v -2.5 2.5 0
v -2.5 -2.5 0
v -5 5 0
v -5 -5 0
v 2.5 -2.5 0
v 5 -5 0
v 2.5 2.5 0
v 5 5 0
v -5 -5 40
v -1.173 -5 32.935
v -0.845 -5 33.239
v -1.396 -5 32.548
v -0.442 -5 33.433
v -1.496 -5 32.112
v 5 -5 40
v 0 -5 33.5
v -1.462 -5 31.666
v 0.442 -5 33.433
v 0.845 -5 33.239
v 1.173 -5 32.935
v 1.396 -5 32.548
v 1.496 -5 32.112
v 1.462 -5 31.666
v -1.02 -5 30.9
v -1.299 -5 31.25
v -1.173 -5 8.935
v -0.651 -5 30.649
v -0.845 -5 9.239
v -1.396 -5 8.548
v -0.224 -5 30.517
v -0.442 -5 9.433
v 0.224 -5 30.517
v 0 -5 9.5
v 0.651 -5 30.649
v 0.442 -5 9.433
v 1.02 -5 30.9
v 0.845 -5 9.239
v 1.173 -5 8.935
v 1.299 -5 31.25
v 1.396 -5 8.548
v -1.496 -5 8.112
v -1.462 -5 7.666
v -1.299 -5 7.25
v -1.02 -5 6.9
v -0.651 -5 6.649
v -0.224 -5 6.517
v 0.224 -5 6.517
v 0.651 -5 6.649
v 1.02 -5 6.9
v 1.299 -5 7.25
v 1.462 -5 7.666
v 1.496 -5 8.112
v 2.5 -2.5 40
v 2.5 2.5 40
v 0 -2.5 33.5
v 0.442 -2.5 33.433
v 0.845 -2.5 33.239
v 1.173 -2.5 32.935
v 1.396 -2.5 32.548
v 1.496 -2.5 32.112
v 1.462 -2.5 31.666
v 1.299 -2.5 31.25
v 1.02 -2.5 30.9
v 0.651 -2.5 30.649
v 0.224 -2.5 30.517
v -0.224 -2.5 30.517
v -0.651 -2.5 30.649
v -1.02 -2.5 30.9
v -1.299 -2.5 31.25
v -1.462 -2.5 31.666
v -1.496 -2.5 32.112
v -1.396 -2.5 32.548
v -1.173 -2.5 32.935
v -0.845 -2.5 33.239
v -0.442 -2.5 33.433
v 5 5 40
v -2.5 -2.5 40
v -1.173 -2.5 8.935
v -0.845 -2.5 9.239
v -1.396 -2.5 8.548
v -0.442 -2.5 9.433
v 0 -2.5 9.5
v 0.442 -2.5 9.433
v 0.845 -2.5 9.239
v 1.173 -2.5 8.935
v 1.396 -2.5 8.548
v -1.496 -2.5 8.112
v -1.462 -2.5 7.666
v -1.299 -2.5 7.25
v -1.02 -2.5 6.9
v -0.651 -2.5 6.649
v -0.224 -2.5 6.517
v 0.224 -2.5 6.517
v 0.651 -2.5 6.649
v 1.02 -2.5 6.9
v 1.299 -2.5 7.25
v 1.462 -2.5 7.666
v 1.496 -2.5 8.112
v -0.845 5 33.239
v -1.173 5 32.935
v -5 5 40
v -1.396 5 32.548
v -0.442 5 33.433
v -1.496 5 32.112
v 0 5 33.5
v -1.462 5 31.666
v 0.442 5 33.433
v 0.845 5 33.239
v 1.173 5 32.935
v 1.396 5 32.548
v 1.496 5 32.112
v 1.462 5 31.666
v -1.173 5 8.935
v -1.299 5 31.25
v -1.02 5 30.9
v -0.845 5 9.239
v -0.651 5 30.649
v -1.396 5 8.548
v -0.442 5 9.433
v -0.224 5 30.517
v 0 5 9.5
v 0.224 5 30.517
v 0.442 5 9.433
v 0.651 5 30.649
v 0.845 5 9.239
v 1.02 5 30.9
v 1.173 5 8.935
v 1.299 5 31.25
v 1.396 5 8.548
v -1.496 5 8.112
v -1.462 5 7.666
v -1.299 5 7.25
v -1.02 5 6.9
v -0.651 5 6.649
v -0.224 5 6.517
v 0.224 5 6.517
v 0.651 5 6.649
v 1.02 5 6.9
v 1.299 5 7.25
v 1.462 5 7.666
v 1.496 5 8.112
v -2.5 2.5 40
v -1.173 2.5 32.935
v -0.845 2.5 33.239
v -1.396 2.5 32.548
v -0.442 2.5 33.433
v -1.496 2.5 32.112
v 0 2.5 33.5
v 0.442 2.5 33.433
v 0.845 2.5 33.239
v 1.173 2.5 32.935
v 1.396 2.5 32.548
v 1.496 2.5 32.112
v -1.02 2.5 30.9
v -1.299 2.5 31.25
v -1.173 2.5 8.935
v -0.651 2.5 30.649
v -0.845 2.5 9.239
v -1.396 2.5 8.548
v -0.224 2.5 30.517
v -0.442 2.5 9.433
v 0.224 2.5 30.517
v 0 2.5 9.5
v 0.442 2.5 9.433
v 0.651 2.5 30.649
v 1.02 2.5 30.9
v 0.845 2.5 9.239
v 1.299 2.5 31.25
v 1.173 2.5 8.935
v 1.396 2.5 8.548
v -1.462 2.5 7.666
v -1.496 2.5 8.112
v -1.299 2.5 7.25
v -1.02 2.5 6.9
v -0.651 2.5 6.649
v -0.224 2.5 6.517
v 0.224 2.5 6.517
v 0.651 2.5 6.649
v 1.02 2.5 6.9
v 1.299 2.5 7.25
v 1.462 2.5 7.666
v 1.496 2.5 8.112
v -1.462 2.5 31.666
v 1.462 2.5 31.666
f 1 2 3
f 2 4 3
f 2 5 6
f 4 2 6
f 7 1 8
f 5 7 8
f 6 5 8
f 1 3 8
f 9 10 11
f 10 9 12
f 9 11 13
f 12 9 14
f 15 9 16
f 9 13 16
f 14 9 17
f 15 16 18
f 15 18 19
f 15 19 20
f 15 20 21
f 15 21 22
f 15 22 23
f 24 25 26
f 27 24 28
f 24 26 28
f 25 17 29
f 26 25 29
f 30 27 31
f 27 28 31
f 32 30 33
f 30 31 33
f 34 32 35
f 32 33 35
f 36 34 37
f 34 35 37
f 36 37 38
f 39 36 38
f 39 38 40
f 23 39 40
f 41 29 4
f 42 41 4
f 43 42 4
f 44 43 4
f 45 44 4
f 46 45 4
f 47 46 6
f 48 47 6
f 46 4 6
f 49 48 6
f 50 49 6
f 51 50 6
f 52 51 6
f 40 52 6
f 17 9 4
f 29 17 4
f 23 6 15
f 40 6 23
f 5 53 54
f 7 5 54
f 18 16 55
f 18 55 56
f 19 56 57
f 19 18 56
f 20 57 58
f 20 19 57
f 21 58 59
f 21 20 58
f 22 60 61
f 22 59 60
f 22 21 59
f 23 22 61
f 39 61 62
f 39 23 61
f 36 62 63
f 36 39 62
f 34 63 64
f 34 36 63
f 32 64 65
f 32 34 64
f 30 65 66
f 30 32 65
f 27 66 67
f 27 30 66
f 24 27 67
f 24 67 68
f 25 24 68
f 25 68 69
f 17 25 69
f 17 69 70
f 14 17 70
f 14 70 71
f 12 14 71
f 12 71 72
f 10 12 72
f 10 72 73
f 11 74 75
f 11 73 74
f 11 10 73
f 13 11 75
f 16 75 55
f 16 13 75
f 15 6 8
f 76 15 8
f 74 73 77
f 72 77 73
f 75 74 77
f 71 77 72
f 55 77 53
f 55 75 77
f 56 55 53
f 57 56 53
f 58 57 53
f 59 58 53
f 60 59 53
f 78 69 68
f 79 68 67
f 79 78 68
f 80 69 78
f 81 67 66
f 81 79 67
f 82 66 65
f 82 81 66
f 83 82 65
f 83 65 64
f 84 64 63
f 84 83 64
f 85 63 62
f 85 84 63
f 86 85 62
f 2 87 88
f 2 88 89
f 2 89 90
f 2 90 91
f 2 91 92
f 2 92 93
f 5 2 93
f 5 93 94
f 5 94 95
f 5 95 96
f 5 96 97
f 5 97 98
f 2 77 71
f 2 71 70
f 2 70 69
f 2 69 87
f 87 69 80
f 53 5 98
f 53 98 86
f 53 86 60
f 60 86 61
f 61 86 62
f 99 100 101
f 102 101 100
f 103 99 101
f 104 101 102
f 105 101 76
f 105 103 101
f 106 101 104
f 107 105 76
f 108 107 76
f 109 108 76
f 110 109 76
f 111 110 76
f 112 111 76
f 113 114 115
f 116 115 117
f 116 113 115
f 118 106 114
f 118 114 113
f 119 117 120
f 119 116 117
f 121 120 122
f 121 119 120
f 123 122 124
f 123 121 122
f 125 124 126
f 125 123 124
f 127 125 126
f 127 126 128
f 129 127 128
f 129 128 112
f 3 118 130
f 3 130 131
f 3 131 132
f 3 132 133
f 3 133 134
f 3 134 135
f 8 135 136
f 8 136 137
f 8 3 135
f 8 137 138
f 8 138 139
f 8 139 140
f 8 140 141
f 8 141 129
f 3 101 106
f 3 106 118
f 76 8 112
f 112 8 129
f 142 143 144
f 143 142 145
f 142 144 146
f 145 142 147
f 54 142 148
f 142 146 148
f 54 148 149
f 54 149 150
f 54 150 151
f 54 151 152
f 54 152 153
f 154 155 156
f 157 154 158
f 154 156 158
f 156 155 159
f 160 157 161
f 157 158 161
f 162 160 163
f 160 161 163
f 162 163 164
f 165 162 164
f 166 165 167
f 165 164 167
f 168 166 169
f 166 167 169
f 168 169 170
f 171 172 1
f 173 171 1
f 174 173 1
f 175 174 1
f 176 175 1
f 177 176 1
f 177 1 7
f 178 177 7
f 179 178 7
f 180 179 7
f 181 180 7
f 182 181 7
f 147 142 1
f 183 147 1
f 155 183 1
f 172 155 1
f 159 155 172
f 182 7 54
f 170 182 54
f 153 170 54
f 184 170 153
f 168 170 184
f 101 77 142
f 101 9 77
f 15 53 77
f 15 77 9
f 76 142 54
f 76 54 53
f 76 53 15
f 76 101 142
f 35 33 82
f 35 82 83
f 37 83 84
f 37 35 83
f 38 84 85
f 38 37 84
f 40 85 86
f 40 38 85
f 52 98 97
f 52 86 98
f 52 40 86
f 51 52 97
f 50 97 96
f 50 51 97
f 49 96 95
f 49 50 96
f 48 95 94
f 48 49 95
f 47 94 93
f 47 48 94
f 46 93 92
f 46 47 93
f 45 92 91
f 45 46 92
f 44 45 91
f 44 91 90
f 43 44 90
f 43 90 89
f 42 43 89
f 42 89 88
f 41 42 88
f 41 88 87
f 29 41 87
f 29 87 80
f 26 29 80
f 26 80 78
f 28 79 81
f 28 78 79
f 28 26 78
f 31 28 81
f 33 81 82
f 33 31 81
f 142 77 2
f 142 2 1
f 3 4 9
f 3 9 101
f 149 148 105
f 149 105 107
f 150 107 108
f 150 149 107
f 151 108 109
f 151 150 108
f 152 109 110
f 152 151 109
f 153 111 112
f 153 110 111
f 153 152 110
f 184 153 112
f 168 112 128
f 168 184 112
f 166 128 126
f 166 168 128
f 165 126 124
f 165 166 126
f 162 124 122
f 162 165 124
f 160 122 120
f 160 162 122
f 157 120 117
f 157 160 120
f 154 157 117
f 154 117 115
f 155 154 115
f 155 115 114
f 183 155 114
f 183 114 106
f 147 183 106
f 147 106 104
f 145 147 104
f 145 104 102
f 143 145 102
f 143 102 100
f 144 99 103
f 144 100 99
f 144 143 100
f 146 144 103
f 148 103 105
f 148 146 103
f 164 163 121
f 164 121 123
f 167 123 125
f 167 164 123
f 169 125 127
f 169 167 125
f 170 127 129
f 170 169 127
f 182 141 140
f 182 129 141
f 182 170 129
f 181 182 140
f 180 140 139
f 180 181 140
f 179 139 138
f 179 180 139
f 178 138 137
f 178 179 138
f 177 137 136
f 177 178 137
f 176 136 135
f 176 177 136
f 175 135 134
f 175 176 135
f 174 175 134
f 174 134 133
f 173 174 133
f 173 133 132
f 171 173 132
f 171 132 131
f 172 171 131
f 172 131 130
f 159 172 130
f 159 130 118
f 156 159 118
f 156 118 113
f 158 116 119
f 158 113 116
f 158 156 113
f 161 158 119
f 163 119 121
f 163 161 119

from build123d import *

# Parameters (mm, degrees)
SKETCH_1_W               = 10
SKETCH_1_H               = 10
EXTRUDE_1_DEPTH          = 40
CUT_EXTRUDE_1_DEPTH      = 42.533119315
CUT_EXTRUDE_1_DEPTH_BACK = 42.533119315
SKETCH_2_R               = 1.5
CUT_EXTRUDE_2_DEPTH      = 42.533119315
CUT_EXTRUDE_2_DEPTH_BACK = 42.533119315
SKETCH_3_R               = 1.5
CUT_EXTRUDE_3_DEPTH      = 41.620192023
CUT_EXTRUDE_3_DEPTH_BACK = 41.620192023
SKETCH_4_W               = 5
SKETCH_4_H               = 5


with BuildPart() as part:
    # 草图1 → 凸台-拉伸1 (new body)
    with BuildSketch(Plane.XY):
        Rectangle(SKETCH_1_W, SKETCH_1_H)
    extrude(amount=EXTRUDE_1_DEPTH)

    # 草图2 → 切除-拉伸1 (cut, two sides: drawn at the far end of the back side and taken through both)
    with BuildSketch(Plane(origin=(0, 5, 0), x_dir=(1, 0, 0), z_dir=(0, 1, 0)).offset(-CUT_EXTRUDE_1_DEPTH_BACK)):
        with Locations(Location((0, -8, 0), (0, 0, 270))):
            Circle(SKETCH_2_R)
    extrude(amount=CUT_EXTRUDE_1_DEPTH + CUT_EXTRUDE_1_DEPTH_BACK, mode=Mode.SUBTRACT)

    # 草图3 → 切除-拉伸2 (cut, two sides: drawn at the far end of the back side and taken through both)
    with BuildSketch(Plane(origin=(0, 5, 0), x_dir=(1, 0, 0), z_dir=(0, 1, 0)).offset(-CUT_EXTRUDE_2_DEPTH_BACK)):
        with Locations(Location((0, -32, 0), (0, 0, 270))):
            Circle(SKETCH_3_R)
    extrude(amount=CUT_EXTRUDE_2_DEPTH + CUT_EXTRUDE_2_DEPTH_BACK, mode=Mode.SUBTRACT)

    # 草图4 → 切除-拉伸3 (cut, two sides: drawn at the far end of the back side and taken through both)
    with BuildSketch(Plane.XY.offset(40).offset(-CUT_EXTRUDE_3_DEPTH_BACK)):
        Rectangle(SKETCH_4_W, SKETCH_4_H)
    extrude(amount=CUT_EXTRUDE_3_DEPTH + CUT_EXTRUDE_3_DEPTH_BACK, mode=Mode.SUBTRACT)


solid = part.part
